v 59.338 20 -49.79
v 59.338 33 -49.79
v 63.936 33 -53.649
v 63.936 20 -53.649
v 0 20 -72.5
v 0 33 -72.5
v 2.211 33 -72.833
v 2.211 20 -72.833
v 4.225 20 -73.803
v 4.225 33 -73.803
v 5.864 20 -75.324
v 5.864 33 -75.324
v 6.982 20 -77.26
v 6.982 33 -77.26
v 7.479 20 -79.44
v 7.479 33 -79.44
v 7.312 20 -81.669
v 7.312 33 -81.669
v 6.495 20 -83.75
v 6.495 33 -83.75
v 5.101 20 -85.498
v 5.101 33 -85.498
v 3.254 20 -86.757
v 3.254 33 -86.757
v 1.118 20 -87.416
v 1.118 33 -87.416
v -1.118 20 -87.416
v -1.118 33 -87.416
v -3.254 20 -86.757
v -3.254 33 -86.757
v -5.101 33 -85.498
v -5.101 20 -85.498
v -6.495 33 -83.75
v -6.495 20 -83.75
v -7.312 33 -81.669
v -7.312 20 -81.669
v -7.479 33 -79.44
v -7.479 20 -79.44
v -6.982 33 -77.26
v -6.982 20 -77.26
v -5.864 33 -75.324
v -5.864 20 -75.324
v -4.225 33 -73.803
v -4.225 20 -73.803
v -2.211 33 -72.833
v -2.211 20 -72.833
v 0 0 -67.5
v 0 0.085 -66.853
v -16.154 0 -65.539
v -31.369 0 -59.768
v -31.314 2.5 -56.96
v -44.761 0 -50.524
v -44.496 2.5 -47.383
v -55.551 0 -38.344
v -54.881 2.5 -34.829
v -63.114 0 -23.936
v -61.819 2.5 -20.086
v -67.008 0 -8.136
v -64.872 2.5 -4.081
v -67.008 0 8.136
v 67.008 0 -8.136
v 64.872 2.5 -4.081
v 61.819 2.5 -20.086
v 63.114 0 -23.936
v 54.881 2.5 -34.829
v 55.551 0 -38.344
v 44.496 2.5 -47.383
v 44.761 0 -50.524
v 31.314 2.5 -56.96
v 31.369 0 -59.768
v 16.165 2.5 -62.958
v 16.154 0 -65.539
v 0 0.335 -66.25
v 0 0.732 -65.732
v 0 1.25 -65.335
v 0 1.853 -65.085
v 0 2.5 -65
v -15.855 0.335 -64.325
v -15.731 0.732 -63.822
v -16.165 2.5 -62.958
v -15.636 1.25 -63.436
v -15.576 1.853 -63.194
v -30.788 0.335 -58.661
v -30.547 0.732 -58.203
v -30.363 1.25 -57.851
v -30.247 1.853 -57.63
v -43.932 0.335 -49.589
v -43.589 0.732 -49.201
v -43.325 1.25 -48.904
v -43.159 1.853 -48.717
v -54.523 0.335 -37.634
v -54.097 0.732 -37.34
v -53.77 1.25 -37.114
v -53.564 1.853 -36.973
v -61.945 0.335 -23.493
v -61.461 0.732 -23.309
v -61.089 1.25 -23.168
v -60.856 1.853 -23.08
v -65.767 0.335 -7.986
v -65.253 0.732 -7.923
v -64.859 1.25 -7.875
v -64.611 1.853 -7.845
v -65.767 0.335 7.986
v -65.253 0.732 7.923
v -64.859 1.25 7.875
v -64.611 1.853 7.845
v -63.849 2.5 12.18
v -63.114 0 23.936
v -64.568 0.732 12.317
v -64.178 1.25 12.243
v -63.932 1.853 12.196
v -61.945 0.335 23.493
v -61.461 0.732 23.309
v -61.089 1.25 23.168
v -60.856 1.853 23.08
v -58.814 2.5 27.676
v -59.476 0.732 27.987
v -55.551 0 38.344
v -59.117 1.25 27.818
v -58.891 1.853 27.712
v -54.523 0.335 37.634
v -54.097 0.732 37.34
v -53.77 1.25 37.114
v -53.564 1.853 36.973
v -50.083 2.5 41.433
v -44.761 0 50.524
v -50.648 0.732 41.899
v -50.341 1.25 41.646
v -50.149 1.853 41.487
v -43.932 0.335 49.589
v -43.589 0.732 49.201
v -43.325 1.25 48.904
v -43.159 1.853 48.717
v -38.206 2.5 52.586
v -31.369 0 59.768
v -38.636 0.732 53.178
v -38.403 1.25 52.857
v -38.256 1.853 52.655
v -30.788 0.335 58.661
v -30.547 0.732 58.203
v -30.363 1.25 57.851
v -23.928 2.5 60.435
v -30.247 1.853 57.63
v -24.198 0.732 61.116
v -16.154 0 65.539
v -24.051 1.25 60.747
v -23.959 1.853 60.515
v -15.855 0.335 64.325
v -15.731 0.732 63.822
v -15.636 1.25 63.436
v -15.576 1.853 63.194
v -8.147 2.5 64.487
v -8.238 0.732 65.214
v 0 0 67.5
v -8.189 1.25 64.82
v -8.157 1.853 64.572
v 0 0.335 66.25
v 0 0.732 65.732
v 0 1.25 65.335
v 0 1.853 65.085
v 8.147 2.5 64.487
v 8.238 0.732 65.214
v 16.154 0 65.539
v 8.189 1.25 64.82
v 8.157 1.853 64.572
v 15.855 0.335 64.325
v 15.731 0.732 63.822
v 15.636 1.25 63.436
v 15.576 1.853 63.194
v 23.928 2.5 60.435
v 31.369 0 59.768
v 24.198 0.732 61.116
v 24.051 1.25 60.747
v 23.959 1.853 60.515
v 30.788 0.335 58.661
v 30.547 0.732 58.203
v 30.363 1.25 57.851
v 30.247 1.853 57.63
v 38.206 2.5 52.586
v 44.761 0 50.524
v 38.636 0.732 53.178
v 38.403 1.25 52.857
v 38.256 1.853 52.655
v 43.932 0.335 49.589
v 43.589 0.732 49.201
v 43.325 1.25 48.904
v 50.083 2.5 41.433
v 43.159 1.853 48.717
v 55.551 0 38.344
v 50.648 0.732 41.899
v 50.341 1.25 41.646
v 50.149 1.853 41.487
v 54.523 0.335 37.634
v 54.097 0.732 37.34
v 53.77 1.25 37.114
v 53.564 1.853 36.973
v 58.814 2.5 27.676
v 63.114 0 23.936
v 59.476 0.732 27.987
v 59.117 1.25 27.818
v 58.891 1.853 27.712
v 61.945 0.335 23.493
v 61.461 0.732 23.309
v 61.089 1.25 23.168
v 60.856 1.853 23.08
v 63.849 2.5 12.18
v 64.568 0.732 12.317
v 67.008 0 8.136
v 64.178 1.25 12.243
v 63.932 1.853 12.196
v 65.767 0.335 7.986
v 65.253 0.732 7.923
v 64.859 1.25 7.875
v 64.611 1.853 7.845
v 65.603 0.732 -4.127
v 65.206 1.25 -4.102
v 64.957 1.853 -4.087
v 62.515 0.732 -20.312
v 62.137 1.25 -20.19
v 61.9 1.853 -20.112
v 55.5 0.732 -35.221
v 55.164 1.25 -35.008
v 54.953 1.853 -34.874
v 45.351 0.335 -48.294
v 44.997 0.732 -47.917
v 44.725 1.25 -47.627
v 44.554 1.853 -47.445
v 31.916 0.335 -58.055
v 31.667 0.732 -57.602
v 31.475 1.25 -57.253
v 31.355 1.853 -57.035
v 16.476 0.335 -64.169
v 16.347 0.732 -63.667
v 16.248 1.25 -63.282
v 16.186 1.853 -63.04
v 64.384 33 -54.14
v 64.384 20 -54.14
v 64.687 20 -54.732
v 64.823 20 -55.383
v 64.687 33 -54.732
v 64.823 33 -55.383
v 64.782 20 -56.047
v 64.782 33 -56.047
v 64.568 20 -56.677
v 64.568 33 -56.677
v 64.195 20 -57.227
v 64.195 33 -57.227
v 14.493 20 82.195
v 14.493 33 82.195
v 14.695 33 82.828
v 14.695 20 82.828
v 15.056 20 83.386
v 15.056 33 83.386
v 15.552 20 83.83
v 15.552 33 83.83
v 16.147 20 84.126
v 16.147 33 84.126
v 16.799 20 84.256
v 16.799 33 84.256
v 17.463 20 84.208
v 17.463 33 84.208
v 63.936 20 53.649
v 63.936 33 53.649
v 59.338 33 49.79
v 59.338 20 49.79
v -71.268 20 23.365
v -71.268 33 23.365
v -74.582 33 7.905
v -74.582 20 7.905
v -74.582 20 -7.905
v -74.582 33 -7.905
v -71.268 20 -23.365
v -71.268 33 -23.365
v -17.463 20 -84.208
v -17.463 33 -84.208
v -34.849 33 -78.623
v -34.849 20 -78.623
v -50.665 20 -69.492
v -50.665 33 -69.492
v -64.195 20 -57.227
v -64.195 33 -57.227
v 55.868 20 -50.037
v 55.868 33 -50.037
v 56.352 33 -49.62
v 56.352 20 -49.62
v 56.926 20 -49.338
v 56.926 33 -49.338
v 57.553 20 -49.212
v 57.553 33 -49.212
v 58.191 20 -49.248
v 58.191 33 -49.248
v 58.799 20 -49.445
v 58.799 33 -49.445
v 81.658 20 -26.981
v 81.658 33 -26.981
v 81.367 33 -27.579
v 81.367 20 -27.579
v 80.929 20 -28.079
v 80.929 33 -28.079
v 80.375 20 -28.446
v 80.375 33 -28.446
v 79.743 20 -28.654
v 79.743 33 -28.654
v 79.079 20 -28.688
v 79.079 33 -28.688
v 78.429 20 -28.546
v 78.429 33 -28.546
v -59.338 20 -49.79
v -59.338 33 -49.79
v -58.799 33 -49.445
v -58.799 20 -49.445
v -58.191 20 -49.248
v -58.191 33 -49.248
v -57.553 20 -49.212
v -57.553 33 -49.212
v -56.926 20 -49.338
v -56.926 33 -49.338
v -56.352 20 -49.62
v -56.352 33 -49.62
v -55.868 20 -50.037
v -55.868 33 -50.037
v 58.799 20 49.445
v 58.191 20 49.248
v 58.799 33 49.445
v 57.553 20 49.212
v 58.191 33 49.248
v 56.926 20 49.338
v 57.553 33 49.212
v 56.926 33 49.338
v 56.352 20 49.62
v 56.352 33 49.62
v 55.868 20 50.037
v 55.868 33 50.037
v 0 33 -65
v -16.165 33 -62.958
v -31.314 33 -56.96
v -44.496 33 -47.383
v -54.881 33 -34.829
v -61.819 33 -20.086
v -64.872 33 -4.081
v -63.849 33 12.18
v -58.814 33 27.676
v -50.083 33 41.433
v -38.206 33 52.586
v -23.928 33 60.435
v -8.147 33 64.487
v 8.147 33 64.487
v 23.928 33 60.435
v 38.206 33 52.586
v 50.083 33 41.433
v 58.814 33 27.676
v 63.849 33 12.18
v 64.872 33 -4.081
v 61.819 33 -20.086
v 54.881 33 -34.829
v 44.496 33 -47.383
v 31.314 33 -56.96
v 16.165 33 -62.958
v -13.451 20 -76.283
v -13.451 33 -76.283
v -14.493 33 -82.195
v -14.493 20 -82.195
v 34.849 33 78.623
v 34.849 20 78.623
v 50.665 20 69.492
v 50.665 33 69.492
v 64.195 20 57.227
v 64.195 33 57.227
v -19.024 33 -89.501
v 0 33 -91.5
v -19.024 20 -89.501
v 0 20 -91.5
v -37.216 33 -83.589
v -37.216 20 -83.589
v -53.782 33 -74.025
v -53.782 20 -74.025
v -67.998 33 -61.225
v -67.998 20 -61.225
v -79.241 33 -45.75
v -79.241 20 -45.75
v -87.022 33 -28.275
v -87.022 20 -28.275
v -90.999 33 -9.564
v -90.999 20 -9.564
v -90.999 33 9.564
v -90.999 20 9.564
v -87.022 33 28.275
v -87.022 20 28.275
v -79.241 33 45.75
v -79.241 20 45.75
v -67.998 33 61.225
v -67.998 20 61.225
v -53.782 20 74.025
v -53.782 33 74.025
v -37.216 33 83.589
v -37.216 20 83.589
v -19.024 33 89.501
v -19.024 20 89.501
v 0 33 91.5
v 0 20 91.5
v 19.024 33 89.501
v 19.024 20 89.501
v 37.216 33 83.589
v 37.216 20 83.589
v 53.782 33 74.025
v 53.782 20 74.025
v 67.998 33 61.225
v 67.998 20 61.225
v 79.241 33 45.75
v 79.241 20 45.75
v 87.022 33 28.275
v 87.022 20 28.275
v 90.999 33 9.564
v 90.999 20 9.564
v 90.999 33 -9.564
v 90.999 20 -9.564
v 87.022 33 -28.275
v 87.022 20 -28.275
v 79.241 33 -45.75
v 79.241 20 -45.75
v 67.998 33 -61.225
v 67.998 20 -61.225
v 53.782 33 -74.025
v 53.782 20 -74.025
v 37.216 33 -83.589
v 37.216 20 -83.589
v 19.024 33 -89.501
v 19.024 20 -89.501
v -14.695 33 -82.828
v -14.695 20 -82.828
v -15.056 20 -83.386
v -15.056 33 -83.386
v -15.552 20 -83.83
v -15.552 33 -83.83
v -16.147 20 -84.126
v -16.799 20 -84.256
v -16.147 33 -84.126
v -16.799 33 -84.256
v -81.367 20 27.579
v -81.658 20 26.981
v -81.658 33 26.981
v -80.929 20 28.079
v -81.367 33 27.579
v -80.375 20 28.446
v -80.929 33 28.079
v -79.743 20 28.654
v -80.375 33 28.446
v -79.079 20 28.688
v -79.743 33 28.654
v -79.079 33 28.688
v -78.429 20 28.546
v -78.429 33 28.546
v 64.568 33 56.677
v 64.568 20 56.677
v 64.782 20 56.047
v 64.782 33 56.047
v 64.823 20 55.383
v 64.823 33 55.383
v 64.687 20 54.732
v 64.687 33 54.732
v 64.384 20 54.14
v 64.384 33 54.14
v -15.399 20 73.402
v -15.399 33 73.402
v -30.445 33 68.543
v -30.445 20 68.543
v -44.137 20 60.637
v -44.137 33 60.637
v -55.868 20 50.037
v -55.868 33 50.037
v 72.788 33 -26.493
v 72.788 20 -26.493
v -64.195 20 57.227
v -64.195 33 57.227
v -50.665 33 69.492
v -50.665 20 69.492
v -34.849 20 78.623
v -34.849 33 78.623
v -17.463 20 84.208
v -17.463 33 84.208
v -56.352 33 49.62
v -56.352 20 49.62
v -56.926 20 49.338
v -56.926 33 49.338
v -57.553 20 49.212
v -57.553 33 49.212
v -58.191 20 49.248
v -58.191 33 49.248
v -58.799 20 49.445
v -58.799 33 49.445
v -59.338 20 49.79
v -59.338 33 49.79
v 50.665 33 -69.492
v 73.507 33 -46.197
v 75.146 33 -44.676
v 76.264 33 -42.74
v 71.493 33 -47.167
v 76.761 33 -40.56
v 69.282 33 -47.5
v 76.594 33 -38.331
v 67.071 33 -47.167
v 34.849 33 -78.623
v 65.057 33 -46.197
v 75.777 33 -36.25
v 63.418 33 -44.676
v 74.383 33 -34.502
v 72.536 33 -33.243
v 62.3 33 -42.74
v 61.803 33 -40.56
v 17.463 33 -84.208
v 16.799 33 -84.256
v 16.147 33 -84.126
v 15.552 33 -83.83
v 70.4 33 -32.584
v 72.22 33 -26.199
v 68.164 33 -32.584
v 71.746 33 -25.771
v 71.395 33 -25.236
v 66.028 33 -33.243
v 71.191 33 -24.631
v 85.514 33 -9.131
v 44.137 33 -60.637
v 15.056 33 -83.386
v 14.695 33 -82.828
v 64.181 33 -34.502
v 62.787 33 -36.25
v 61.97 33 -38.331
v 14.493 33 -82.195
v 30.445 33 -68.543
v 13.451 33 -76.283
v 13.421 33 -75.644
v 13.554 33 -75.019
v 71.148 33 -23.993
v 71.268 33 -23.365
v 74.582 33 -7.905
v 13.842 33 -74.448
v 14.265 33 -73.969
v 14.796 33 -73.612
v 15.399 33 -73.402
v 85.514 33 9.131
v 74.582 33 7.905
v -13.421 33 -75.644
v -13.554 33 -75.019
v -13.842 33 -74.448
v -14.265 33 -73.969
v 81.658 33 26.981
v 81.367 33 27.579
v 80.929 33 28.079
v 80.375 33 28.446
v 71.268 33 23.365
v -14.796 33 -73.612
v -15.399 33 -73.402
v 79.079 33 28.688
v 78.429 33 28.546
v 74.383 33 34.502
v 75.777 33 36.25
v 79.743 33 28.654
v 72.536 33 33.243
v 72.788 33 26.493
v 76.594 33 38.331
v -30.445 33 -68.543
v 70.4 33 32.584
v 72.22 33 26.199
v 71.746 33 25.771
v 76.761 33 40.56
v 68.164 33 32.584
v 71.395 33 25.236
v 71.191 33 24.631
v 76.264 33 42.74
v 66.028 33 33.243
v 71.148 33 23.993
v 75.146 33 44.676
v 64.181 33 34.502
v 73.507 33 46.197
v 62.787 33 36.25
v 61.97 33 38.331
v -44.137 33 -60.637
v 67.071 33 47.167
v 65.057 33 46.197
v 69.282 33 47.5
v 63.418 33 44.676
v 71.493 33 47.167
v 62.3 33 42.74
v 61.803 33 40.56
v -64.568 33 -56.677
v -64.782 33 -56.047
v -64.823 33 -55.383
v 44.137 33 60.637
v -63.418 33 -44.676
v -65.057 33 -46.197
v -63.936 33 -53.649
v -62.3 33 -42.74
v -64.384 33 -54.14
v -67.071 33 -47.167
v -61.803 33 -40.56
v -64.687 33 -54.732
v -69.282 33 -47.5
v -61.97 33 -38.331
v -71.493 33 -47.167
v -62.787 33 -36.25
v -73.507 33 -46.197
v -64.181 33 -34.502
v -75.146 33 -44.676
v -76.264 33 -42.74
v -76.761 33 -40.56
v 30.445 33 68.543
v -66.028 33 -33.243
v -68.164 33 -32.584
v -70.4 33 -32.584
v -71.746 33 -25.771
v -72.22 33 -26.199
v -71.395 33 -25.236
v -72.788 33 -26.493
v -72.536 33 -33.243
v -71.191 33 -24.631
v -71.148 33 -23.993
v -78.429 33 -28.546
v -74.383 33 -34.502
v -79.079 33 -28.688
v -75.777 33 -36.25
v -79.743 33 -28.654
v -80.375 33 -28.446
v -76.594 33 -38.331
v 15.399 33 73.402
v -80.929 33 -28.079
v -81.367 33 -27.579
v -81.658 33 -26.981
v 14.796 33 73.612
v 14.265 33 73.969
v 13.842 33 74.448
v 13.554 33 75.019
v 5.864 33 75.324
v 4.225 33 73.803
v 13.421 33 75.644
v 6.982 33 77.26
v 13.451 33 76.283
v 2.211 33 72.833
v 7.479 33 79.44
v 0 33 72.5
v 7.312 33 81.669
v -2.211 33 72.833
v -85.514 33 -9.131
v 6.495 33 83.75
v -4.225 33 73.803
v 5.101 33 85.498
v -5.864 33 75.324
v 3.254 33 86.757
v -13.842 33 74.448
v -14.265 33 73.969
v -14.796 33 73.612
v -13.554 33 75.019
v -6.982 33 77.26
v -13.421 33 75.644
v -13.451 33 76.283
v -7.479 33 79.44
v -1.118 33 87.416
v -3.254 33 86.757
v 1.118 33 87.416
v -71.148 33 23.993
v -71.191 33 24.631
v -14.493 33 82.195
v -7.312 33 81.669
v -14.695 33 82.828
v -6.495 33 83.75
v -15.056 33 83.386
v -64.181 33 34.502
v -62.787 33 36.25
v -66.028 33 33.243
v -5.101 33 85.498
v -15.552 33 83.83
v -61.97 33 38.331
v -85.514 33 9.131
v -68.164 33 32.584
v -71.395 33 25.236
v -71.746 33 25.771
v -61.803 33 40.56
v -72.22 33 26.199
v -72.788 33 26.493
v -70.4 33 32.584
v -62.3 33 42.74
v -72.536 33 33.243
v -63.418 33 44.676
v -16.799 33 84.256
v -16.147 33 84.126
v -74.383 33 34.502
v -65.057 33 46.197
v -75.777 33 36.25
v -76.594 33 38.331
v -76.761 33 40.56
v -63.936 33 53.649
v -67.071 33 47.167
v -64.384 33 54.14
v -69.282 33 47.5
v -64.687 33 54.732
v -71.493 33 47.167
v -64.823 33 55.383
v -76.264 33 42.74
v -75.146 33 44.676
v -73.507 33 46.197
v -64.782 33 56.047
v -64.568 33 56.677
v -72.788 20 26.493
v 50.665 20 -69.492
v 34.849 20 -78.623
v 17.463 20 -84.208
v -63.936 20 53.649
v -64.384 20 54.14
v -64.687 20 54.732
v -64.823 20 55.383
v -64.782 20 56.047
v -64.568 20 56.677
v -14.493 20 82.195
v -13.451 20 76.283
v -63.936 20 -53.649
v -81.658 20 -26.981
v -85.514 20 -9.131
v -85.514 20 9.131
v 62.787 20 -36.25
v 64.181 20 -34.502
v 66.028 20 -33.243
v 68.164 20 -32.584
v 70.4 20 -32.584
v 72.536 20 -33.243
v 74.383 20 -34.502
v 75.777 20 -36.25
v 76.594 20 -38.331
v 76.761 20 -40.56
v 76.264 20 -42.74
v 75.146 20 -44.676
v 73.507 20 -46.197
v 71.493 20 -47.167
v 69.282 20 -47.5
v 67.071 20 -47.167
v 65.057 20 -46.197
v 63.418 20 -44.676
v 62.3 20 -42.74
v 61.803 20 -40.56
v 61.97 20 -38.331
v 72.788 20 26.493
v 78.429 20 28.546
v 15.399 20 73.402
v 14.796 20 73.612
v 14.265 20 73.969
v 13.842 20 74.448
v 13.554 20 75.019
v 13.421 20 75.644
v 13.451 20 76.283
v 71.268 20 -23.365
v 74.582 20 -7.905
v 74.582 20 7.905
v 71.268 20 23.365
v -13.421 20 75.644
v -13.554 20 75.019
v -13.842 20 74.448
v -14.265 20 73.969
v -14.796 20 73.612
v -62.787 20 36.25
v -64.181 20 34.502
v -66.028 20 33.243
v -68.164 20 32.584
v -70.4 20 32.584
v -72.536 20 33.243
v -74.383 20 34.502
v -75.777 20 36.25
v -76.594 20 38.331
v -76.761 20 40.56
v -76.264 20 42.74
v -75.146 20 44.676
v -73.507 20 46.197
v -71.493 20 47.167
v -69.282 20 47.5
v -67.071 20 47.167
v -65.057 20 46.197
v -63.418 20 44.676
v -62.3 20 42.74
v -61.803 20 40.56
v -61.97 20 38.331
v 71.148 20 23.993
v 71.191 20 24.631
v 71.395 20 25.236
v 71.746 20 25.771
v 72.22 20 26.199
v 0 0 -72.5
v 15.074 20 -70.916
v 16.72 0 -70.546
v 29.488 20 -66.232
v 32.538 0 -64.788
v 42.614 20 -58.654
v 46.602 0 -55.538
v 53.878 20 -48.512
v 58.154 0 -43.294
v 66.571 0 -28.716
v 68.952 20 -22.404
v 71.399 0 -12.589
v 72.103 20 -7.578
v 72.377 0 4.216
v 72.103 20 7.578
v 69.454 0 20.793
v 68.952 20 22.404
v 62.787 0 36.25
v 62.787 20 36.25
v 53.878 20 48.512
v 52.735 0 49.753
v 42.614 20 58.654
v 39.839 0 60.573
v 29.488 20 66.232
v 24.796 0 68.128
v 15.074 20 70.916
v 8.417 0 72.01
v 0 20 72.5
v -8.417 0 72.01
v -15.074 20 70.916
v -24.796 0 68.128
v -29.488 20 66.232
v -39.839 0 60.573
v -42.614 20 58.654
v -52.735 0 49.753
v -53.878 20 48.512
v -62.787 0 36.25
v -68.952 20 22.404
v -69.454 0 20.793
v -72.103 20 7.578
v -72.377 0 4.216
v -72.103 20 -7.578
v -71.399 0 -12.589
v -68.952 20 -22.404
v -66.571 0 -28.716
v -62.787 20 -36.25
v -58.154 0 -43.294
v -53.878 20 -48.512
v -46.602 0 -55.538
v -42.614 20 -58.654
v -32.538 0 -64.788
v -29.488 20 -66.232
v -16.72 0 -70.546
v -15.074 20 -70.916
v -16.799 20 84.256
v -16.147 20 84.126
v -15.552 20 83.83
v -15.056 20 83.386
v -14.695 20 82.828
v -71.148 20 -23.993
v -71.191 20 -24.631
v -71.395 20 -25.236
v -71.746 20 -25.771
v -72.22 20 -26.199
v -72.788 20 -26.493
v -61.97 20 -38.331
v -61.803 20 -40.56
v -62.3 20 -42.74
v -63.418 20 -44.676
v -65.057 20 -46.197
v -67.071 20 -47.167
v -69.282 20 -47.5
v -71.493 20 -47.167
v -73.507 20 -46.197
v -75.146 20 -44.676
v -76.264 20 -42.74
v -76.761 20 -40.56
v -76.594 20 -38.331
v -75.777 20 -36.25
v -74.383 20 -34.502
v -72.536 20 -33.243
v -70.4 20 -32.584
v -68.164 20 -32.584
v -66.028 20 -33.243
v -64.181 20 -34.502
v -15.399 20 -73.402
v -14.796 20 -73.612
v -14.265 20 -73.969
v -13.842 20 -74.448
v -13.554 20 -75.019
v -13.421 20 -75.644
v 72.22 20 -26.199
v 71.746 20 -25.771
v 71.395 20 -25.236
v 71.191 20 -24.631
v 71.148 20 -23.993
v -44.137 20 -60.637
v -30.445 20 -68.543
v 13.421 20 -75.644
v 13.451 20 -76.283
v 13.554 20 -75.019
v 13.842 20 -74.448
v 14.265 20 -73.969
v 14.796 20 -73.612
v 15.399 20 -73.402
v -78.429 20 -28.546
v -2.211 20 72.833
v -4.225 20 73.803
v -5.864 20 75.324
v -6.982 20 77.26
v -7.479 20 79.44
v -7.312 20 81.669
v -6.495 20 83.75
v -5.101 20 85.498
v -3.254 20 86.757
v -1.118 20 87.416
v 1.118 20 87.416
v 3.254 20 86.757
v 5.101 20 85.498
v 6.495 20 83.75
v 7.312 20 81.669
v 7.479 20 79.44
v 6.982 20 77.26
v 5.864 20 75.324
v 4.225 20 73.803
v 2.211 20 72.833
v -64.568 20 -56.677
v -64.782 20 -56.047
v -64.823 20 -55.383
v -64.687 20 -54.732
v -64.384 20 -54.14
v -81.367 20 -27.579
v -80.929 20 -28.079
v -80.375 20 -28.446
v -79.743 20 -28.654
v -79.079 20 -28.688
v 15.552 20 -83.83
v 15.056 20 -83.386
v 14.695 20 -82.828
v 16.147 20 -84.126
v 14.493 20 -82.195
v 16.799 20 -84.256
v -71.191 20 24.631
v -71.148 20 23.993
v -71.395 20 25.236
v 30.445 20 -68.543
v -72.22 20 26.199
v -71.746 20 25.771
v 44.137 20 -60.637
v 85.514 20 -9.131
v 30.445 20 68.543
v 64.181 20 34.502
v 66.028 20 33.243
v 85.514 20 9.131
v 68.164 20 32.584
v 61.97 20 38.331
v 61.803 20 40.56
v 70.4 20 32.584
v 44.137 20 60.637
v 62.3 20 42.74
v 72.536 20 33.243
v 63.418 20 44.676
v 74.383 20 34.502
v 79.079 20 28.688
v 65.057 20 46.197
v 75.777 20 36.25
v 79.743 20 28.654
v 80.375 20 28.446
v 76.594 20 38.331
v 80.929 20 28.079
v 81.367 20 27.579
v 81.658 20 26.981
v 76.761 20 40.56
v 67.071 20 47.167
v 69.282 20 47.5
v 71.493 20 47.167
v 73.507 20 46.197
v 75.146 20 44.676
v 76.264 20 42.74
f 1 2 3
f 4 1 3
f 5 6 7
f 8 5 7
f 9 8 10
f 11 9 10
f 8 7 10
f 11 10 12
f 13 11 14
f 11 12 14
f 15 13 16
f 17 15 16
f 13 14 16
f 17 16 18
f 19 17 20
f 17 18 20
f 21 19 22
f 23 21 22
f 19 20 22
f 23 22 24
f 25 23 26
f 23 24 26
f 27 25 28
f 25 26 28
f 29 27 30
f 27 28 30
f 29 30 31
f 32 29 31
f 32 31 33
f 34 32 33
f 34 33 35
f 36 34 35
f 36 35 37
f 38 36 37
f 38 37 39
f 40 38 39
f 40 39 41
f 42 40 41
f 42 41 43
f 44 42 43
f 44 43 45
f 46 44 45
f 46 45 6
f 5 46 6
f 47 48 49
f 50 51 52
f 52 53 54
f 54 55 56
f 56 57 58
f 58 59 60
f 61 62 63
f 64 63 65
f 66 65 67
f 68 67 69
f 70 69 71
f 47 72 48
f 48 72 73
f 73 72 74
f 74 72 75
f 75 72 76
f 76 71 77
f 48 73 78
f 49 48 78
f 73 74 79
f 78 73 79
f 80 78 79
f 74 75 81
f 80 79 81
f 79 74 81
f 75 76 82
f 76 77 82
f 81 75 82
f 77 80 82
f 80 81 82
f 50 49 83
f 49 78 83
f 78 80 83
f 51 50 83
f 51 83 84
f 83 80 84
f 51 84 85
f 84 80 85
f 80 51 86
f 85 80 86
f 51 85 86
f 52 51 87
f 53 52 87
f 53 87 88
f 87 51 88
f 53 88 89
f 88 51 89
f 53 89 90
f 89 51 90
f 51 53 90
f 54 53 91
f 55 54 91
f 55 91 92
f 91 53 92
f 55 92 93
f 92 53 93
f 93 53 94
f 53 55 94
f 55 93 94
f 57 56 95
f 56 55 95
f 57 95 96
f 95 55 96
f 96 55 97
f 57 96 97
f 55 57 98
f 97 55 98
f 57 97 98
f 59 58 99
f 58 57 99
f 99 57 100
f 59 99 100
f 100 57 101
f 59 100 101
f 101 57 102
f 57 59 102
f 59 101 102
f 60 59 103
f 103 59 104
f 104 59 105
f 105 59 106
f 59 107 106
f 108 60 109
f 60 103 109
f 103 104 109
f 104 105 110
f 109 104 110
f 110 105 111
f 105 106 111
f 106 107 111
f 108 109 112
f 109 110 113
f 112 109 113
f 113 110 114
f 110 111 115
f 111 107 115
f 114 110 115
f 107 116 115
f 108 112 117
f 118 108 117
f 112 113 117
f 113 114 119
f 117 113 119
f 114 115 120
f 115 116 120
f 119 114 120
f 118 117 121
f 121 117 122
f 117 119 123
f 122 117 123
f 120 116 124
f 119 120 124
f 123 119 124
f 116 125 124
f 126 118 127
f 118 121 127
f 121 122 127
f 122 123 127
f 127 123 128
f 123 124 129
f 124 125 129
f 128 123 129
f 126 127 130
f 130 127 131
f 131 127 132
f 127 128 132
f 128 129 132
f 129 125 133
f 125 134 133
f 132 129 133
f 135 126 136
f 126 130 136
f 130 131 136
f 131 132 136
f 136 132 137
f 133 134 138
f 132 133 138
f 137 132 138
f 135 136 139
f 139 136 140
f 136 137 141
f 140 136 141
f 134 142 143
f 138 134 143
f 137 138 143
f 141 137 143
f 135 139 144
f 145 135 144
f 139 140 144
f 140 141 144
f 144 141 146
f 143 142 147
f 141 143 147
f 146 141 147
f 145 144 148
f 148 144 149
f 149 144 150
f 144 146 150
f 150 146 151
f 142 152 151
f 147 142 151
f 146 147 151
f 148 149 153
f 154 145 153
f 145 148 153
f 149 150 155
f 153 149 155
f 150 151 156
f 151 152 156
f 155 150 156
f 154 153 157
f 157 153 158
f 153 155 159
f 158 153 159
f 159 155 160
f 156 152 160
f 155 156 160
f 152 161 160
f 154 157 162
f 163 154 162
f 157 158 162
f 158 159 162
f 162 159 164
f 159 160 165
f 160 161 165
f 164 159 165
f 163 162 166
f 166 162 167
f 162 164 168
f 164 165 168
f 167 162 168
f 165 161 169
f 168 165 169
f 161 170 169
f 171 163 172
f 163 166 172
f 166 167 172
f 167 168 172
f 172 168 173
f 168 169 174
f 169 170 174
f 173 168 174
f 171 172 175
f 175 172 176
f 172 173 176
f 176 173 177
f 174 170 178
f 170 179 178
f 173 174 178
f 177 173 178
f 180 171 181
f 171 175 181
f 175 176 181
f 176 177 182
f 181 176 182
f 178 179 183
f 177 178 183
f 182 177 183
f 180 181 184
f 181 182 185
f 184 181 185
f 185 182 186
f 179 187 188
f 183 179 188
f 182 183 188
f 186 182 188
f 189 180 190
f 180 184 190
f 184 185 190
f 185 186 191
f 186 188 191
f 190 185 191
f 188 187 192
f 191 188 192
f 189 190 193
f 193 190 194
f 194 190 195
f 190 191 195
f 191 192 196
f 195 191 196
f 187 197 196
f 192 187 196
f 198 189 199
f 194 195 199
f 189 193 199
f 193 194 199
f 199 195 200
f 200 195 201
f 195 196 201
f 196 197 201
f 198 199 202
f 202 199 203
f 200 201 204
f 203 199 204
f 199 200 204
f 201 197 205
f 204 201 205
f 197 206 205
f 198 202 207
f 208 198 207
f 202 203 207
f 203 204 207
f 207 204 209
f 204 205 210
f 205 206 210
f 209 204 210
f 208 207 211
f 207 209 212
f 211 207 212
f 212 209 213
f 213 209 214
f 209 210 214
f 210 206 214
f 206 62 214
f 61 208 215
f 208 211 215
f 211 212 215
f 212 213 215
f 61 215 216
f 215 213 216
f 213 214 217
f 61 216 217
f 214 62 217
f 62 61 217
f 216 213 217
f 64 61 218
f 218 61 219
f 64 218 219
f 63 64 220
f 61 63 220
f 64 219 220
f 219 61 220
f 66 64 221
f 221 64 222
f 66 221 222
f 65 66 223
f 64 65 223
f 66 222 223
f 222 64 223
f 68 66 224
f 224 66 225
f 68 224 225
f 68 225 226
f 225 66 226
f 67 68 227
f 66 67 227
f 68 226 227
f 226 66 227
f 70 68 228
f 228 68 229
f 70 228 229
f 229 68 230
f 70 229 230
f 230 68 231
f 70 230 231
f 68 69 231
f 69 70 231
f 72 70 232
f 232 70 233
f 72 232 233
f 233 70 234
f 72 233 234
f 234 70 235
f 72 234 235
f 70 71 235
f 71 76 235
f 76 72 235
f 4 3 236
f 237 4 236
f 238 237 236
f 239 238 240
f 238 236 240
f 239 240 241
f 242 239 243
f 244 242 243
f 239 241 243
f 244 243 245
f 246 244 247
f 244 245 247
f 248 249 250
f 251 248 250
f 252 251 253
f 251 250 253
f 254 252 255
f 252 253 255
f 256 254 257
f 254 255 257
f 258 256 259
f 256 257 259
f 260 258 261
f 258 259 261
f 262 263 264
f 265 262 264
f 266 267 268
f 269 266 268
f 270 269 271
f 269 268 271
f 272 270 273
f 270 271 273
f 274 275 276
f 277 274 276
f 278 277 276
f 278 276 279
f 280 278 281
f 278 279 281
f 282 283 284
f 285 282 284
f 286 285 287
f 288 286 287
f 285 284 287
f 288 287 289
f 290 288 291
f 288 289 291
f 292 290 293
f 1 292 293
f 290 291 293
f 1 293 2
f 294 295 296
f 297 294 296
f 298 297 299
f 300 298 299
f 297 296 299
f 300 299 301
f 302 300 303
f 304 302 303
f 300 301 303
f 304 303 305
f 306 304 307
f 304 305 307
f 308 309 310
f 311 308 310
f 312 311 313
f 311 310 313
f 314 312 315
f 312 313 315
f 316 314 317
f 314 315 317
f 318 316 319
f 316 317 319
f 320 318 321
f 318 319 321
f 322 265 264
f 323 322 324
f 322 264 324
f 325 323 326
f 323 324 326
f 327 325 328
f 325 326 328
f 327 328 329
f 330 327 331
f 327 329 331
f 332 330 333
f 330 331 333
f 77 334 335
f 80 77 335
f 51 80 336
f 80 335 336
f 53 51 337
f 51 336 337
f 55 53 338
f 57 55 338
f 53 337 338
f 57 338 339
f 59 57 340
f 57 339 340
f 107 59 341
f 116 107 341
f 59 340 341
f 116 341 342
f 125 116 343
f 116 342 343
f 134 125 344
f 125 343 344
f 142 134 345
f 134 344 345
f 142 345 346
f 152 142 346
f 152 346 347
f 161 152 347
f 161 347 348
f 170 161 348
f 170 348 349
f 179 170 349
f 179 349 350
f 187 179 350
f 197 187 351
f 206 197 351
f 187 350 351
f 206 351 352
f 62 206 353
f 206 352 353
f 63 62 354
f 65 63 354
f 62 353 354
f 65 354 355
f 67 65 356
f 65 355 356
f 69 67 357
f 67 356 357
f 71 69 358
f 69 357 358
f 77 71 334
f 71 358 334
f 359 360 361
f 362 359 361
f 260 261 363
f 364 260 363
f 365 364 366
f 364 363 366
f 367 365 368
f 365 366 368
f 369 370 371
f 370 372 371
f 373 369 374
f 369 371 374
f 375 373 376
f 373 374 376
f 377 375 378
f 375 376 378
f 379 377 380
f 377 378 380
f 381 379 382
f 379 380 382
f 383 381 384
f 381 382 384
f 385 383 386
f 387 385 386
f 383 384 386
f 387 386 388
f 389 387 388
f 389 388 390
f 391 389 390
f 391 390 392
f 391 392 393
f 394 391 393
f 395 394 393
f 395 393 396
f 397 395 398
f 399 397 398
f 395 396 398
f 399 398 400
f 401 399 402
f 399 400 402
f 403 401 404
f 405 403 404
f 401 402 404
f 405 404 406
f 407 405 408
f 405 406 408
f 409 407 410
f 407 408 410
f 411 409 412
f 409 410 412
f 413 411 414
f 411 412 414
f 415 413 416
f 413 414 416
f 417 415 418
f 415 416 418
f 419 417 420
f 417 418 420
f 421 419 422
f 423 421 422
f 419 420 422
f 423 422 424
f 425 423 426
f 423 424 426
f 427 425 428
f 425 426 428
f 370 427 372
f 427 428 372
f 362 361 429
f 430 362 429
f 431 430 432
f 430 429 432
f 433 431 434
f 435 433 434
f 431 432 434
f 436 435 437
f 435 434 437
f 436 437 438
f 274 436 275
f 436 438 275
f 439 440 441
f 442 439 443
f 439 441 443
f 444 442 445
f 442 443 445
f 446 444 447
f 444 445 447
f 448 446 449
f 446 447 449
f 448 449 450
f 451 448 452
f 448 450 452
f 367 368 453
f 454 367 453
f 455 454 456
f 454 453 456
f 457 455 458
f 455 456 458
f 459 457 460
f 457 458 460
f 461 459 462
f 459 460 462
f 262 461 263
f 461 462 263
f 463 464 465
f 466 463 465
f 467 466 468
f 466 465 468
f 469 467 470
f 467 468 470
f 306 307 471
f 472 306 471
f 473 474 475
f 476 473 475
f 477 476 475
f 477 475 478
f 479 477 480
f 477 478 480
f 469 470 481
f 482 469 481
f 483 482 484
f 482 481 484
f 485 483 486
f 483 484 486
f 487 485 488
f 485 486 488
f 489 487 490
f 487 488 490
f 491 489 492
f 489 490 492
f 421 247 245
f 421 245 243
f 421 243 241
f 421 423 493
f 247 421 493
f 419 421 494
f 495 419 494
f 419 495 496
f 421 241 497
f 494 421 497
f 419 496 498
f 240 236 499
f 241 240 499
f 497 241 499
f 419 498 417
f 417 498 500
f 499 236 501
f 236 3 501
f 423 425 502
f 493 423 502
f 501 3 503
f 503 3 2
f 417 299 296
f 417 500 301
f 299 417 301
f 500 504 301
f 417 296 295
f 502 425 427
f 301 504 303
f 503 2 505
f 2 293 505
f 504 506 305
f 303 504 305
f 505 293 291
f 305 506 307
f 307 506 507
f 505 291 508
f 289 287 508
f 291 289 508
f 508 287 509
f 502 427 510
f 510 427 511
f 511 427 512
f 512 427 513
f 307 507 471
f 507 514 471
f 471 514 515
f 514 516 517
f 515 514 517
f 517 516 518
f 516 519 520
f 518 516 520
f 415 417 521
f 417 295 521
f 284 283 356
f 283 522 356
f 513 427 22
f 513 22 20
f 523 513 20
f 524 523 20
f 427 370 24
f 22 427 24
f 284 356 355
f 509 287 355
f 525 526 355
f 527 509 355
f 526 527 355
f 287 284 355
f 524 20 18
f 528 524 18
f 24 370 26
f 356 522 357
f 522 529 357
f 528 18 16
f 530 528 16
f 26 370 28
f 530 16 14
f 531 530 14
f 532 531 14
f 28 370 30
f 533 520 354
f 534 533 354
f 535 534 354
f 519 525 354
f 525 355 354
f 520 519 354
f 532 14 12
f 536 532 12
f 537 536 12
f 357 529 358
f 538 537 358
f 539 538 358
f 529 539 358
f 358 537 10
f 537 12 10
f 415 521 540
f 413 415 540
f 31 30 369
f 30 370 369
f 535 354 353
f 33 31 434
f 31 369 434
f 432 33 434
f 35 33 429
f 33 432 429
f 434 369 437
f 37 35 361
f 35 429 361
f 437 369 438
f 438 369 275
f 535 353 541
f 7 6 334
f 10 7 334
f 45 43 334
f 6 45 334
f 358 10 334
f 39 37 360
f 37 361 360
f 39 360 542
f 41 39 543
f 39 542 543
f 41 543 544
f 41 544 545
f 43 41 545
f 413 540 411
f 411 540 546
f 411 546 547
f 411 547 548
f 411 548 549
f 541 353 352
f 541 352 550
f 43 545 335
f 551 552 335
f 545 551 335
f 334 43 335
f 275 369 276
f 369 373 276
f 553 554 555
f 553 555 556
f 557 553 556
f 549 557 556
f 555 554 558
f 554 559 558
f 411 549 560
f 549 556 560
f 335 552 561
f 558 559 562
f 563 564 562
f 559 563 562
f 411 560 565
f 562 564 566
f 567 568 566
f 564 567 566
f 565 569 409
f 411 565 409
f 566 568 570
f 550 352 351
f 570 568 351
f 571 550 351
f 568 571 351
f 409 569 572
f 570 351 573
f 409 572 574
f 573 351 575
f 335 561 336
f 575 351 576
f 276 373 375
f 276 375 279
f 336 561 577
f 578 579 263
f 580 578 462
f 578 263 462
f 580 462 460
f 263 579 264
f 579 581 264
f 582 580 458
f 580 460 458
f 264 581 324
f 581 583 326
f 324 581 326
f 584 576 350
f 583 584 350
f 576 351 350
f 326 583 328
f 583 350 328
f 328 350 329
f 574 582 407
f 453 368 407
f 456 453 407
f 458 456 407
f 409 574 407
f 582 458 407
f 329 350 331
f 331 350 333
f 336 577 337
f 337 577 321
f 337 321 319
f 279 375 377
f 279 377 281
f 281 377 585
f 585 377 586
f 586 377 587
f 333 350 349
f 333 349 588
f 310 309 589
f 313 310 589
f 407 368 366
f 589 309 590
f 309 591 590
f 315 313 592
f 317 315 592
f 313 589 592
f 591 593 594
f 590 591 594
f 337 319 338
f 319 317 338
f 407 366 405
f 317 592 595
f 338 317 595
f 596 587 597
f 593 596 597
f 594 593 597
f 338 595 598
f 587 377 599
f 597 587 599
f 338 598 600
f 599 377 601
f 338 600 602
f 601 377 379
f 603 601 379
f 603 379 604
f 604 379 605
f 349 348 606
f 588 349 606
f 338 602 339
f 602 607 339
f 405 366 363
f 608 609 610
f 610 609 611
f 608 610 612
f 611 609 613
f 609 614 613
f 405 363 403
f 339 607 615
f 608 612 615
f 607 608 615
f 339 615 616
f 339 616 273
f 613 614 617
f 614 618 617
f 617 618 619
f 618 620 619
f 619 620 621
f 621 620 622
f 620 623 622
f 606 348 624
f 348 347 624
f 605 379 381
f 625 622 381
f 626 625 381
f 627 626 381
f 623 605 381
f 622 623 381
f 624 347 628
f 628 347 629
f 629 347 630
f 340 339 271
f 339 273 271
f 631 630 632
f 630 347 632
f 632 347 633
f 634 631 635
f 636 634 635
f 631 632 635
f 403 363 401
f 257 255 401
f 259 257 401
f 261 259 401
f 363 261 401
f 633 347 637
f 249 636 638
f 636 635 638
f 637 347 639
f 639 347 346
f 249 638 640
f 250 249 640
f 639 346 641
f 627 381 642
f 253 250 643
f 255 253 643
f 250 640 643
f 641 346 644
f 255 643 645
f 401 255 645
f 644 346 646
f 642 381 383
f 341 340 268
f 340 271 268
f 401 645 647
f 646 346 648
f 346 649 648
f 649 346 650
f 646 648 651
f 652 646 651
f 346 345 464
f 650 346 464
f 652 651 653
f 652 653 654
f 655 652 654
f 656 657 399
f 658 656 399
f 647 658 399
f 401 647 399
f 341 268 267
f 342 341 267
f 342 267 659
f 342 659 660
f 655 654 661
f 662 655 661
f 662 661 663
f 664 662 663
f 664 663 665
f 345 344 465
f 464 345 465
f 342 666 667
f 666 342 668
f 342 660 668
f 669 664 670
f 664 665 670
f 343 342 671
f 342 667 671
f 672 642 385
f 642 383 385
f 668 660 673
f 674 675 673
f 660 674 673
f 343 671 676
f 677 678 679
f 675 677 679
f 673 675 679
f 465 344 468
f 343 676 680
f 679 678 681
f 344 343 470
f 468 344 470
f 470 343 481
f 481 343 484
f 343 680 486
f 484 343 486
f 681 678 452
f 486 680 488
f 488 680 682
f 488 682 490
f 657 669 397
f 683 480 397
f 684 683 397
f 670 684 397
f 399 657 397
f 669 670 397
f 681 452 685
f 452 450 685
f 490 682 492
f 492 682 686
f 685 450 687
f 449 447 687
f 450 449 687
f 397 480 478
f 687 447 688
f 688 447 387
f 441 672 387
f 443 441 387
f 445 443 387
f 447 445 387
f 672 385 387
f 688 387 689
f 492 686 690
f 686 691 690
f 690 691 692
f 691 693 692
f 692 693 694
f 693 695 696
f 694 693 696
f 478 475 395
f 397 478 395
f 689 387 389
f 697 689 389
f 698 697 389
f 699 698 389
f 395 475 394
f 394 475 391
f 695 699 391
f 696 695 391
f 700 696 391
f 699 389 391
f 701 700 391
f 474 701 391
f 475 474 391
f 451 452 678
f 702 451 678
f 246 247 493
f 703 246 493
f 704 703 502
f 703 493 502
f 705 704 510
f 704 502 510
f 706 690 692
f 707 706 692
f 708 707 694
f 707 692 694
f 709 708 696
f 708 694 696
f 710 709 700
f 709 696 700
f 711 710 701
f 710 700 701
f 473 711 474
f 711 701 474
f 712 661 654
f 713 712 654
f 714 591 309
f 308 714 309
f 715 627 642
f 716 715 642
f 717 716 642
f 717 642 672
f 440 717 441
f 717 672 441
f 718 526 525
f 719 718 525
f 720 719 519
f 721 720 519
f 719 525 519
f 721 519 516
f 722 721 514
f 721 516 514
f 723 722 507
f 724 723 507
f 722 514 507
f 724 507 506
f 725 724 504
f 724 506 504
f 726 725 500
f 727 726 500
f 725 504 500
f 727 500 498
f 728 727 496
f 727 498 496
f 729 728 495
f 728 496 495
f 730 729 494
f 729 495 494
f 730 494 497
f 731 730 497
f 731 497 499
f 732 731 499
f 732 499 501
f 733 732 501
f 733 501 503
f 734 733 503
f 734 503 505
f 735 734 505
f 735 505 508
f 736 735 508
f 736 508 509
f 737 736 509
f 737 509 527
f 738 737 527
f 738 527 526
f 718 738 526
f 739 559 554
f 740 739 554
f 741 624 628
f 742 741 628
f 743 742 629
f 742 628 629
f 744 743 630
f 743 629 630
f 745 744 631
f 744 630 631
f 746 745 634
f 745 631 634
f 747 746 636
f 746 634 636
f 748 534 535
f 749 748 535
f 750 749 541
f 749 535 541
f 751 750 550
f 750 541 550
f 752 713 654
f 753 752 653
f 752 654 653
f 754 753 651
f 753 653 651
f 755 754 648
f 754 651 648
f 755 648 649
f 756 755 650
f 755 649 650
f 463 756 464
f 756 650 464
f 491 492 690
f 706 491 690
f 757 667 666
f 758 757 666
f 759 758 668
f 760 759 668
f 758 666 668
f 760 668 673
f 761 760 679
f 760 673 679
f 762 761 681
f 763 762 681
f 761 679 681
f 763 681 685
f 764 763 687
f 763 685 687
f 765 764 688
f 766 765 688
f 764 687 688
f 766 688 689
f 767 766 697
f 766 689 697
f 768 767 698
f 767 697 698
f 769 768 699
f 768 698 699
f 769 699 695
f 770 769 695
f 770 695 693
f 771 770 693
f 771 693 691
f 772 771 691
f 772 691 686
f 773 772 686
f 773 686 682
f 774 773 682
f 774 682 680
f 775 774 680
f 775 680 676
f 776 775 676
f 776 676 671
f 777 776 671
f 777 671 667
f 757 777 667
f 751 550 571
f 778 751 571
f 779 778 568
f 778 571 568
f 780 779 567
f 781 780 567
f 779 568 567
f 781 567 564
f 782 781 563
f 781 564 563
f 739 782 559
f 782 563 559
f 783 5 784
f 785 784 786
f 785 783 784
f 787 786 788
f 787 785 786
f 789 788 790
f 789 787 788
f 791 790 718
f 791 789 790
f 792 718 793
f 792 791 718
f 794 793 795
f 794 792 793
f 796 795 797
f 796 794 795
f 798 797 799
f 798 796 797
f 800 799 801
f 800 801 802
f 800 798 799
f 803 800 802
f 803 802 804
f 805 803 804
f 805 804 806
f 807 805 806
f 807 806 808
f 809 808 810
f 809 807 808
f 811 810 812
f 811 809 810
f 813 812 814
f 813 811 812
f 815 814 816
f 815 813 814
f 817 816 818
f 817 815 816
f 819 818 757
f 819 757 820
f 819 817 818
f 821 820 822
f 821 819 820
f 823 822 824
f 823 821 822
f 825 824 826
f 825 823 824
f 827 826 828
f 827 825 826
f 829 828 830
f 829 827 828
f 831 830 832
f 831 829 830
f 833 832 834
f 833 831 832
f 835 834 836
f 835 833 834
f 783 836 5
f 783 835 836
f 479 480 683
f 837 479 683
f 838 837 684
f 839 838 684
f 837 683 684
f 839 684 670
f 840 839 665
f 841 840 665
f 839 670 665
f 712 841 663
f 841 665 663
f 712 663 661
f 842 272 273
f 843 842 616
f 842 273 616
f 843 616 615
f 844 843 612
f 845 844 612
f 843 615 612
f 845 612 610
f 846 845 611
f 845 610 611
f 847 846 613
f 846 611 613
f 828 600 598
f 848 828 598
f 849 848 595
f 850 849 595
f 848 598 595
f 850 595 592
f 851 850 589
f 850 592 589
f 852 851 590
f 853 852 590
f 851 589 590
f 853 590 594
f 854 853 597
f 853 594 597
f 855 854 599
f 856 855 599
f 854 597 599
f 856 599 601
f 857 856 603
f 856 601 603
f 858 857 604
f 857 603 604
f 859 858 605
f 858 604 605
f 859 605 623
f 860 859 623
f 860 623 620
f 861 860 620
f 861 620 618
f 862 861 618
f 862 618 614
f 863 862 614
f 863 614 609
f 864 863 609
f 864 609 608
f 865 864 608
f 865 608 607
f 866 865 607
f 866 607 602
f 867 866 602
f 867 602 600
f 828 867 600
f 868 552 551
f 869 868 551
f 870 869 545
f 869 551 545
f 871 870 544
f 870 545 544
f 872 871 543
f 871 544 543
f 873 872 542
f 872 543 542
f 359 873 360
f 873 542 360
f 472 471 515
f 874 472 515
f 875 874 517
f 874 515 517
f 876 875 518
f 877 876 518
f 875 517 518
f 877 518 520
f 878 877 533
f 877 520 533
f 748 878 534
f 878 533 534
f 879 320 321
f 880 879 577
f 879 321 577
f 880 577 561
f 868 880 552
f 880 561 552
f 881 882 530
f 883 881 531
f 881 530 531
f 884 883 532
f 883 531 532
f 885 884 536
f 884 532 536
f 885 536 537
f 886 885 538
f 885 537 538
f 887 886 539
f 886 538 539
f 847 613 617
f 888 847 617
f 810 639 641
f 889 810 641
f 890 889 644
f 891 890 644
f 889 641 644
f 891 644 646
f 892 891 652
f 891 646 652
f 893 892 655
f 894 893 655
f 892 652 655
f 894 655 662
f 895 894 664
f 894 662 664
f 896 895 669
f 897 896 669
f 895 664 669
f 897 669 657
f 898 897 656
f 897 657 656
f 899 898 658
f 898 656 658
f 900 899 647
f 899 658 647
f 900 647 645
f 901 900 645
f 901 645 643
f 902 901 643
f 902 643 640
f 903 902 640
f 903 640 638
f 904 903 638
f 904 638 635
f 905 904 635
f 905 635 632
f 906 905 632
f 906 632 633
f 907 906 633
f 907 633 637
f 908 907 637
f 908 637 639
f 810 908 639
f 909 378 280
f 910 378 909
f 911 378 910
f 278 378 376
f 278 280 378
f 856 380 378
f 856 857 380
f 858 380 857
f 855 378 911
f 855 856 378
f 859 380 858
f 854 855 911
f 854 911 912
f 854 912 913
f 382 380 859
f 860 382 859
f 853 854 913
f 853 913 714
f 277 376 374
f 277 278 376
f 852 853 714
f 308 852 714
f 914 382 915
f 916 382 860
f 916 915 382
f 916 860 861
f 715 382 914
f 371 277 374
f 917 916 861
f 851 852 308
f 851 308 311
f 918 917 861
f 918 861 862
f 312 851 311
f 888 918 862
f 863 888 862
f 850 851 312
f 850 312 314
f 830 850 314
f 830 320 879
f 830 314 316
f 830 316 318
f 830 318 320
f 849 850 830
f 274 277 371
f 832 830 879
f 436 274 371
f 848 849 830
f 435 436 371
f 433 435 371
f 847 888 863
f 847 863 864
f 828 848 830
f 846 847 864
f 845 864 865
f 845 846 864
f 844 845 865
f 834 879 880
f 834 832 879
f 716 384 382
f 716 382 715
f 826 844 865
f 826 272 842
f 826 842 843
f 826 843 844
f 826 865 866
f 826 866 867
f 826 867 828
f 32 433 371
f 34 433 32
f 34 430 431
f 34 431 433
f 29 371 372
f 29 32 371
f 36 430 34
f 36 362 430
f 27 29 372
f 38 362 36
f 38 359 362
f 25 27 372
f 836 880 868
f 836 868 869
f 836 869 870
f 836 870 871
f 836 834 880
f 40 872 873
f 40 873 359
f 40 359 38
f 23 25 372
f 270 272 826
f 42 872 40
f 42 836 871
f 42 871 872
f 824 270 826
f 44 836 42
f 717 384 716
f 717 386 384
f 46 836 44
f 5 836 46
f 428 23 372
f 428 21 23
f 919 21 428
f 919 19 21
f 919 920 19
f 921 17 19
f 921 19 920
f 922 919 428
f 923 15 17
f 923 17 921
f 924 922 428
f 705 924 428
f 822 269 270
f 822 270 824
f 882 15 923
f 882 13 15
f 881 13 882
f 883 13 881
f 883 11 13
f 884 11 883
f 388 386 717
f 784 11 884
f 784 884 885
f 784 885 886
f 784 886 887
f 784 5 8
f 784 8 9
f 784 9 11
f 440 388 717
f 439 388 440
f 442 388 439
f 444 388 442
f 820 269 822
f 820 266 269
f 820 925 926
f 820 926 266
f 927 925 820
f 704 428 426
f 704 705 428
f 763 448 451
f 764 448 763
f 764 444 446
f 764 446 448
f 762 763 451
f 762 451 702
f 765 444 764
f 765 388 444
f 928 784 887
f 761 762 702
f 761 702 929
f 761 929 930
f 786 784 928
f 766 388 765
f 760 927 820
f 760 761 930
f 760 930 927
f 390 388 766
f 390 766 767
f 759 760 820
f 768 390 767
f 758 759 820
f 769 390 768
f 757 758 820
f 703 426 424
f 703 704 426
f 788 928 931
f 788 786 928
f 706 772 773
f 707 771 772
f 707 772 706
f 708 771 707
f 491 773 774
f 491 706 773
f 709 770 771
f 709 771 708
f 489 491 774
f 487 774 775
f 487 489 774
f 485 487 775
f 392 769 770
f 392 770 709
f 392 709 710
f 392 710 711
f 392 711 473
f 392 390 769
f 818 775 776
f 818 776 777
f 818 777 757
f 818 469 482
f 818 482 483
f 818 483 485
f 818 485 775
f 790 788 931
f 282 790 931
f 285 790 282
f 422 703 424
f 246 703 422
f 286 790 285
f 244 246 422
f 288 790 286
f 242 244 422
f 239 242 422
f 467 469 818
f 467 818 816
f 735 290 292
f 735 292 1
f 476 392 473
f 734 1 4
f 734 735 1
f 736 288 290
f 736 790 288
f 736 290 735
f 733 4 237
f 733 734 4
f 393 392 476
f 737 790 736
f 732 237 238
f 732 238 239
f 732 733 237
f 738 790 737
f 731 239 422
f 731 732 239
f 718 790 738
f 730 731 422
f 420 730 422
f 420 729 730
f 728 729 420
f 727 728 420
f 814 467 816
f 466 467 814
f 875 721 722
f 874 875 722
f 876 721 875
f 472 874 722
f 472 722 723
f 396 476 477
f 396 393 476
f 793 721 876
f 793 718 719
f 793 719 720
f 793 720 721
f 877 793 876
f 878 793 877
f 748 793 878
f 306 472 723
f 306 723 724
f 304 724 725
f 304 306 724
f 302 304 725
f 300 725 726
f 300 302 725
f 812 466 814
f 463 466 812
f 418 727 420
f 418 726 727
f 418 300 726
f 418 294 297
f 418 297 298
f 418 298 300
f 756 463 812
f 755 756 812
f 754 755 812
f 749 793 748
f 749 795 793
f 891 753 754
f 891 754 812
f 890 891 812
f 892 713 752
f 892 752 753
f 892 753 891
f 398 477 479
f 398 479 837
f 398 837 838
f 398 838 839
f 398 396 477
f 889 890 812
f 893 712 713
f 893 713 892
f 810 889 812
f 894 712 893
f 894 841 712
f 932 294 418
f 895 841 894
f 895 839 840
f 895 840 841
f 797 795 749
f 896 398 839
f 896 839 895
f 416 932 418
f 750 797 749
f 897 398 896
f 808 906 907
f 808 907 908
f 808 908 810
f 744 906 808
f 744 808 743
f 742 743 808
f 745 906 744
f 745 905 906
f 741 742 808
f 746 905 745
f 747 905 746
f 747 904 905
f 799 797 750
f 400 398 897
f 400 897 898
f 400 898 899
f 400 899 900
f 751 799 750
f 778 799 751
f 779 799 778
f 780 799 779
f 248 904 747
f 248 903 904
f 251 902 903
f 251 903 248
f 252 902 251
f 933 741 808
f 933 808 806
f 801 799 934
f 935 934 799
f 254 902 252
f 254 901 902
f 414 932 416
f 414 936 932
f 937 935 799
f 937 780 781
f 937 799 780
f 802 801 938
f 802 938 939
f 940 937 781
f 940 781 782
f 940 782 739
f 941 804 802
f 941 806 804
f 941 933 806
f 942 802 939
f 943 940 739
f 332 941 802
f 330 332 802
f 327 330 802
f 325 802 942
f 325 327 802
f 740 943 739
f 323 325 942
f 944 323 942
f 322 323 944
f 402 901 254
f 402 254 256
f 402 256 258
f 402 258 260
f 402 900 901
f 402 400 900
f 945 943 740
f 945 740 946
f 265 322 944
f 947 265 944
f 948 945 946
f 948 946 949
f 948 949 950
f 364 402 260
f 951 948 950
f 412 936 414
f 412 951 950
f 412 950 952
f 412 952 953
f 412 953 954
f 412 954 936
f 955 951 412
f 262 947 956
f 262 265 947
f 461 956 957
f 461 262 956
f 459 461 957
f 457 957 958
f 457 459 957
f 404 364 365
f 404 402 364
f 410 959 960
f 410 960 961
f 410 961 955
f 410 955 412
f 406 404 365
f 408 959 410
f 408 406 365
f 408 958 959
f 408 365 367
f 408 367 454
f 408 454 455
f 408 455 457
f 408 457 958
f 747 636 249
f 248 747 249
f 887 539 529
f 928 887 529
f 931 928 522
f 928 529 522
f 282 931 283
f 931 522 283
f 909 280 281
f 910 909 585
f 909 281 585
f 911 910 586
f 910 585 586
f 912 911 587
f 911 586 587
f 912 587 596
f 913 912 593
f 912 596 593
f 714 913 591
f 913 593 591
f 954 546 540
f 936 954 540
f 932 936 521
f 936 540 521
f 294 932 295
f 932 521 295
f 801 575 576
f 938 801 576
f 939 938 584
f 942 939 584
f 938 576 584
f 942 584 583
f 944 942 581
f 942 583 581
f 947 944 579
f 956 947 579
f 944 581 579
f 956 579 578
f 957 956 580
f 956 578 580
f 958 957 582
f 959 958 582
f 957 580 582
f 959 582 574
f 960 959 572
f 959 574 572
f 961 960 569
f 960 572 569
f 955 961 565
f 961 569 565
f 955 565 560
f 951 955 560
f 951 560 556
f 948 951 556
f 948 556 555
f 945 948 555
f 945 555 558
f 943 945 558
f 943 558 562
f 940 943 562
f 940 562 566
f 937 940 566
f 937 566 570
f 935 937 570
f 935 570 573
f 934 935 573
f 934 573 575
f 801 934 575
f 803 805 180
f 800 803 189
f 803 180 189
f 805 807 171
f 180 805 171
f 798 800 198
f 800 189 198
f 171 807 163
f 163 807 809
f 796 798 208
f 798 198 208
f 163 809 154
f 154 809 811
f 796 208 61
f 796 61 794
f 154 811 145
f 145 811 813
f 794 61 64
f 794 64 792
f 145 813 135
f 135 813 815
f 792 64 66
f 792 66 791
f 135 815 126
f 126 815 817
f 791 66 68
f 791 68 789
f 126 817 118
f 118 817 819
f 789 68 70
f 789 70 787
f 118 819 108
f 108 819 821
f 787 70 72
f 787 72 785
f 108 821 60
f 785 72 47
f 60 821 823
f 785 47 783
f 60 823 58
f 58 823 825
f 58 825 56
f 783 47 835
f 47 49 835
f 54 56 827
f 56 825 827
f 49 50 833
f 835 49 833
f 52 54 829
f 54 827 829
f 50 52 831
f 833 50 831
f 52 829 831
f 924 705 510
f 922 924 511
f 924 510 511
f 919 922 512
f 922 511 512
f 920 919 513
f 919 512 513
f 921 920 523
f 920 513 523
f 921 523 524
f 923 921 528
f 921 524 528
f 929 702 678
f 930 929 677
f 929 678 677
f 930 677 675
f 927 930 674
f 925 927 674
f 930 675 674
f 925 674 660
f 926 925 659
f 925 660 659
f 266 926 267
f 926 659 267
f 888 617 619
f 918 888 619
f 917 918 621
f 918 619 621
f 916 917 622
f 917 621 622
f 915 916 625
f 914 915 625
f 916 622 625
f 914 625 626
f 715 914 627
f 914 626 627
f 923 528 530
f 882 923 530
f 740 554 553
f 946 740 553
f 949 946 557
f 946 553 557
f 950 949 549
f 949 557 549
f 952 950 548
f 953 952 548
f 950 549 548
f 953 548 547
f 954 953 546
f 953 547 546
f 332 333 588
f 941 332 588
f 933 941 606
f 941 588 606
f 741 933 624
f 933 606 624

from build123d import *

# Parameters (mm, degrees)
SKETCH_2_R               = 7.5
CUT_EXTRUDE_1_DEPTH      = 134.542128184
CUT_EXTRUDE_2_DEPTH      = 134.542128184
PATTERN_CIRCULAR_1_COUNT = 6
FILLET_1_R               = 2.5
SKETCH_4_R               = 100
SKETCH_4_R_2             = 72.5
CUT_EXTRUDE_3_DEPTH      = 20


with BuildPart() as part:
    # 草图1 → 旋转1 (revolve)
    with BuildSketch(Plane(origin=(0, 0, 0), x_dir=(0, 0, -1), z_dir=(1, 0, 0)), mode=Mode.PRIVATE) as revolve_1_sk:
        Polygon((-91.5, 33), (-91.5, 0), (-65, 0), (-65, 3), (-65, 33), (-69, 33), align=None)
    revolve(revolve_1_sk.sketch.rotate(Axis((0, 0, 0), (0, 1, 0)), 180), axis=Axis((0, 0, 0), (0, 1, 0)))

    # 草图2 → 切除-拉伸1 (cut, through all)
    with BuildSketch(Plane(origin=(0, 33, 0), x_dir=(1, 0, 0), z_dir=(0, 1, 0))):
        with Locations(Location((0, 80, 0), (0, 0, 270))):
            Circle(SKETCH_2_R)
    cut_extrude_1 = extrude(amount=-CUT_EXTRUDE_1_DEPTH, mode=Mode.SUBTRACT)

    # 草图3 → 切除-拉伸2 (cut, through all)
    with BuildSketch(Plane(origin=(0, 33, 0), x_dir=(1, 0, 0), z_dir=(0, 1, 0))):
        with BuildLine():
            Line((-72.788277417, 26.492766383), (-78.429157814, 28.545878943))
            ThreePointArc((-78.429157814, 28.545878943), (-80.374557913, 28.44634458), (-81.65798686, 26.980978151))
            ThreePointArc((-81.65798686, 26.980978151), (-86, 0), (-81.65798686, -26.980978151))
            ThreePointArc((-81.65798686, -26.980978151), (-80.374557913, -28.44634458), (-78.429157814, -28.545878943))
            Line((-78.429157814, -28.545878943), (-72.788277417, -26.492766383))
            ThreePointArc((-72.788277417, -26.492766383), (-71.394896395, -25.236492438), (-71.267736557, -23.364711127))
            ThreePointArc((-71.267736557, -23.364711127), (-75, 0), (-71.267736557, 23.364711127))
            ThreePointArc((-71.267736557, 23.364711127), (-71.394896395, 25.236492438), (-72.788277417, 26.492766383))
        make_face()
    cut_extrude_2 = extrude(amount=-CUT_EXTRUDE_2_DEPTH, mode=Mode.SUBTRACT)

    # 阵列(圆周)1: 切除-拉伸1, 切除-拉伸2 ×6 about axis
    pattern_circular_1_axis = Axis((0, 0, 0), (0, 1, 0))
    add([cut_extrude_1.rotate(pattern_circular_1_axis, i * 360 / PATTERN_CIRCULAR_1_COUNT) for i in range(1, PATTERN_CIRCULAR_1_COUNT)], mode=Mode.SUBTRACT)
    add([cut_extrude_2.rotate(pattern_circular_1_axis, i * 360 / PATTERN_CIRCULAR_1_COUNT) for i in range(1, PATTERN_CIRCULAR_1_COUNT)], mode=Mode.SUBTRACT)

    # 圆角1
    fillet_1_edges = [part.edges().sort_by_distance(p)[0] for p in [
        (0, 0, 65),
        (0, 0, 91.5),
    ]]
    fillet(fillet_1_edges, radius=FILLET_1_R)

    # 草图4 → 切除-拉伸3 (cut)
    with BuildSketch(Plane.XZ):
        Circle(SKETCH_4_R)
        with Locations(Location((0, 0, 0), (0, 0, 270))):
            Circle(SKETCH_4_R_2, mode=Mode.SUBTRACT)
    extrude(amount=-CUT_EXTRUDE_3_DEPTH, mode=Mode.SUBTRACT)


solid = part.part
